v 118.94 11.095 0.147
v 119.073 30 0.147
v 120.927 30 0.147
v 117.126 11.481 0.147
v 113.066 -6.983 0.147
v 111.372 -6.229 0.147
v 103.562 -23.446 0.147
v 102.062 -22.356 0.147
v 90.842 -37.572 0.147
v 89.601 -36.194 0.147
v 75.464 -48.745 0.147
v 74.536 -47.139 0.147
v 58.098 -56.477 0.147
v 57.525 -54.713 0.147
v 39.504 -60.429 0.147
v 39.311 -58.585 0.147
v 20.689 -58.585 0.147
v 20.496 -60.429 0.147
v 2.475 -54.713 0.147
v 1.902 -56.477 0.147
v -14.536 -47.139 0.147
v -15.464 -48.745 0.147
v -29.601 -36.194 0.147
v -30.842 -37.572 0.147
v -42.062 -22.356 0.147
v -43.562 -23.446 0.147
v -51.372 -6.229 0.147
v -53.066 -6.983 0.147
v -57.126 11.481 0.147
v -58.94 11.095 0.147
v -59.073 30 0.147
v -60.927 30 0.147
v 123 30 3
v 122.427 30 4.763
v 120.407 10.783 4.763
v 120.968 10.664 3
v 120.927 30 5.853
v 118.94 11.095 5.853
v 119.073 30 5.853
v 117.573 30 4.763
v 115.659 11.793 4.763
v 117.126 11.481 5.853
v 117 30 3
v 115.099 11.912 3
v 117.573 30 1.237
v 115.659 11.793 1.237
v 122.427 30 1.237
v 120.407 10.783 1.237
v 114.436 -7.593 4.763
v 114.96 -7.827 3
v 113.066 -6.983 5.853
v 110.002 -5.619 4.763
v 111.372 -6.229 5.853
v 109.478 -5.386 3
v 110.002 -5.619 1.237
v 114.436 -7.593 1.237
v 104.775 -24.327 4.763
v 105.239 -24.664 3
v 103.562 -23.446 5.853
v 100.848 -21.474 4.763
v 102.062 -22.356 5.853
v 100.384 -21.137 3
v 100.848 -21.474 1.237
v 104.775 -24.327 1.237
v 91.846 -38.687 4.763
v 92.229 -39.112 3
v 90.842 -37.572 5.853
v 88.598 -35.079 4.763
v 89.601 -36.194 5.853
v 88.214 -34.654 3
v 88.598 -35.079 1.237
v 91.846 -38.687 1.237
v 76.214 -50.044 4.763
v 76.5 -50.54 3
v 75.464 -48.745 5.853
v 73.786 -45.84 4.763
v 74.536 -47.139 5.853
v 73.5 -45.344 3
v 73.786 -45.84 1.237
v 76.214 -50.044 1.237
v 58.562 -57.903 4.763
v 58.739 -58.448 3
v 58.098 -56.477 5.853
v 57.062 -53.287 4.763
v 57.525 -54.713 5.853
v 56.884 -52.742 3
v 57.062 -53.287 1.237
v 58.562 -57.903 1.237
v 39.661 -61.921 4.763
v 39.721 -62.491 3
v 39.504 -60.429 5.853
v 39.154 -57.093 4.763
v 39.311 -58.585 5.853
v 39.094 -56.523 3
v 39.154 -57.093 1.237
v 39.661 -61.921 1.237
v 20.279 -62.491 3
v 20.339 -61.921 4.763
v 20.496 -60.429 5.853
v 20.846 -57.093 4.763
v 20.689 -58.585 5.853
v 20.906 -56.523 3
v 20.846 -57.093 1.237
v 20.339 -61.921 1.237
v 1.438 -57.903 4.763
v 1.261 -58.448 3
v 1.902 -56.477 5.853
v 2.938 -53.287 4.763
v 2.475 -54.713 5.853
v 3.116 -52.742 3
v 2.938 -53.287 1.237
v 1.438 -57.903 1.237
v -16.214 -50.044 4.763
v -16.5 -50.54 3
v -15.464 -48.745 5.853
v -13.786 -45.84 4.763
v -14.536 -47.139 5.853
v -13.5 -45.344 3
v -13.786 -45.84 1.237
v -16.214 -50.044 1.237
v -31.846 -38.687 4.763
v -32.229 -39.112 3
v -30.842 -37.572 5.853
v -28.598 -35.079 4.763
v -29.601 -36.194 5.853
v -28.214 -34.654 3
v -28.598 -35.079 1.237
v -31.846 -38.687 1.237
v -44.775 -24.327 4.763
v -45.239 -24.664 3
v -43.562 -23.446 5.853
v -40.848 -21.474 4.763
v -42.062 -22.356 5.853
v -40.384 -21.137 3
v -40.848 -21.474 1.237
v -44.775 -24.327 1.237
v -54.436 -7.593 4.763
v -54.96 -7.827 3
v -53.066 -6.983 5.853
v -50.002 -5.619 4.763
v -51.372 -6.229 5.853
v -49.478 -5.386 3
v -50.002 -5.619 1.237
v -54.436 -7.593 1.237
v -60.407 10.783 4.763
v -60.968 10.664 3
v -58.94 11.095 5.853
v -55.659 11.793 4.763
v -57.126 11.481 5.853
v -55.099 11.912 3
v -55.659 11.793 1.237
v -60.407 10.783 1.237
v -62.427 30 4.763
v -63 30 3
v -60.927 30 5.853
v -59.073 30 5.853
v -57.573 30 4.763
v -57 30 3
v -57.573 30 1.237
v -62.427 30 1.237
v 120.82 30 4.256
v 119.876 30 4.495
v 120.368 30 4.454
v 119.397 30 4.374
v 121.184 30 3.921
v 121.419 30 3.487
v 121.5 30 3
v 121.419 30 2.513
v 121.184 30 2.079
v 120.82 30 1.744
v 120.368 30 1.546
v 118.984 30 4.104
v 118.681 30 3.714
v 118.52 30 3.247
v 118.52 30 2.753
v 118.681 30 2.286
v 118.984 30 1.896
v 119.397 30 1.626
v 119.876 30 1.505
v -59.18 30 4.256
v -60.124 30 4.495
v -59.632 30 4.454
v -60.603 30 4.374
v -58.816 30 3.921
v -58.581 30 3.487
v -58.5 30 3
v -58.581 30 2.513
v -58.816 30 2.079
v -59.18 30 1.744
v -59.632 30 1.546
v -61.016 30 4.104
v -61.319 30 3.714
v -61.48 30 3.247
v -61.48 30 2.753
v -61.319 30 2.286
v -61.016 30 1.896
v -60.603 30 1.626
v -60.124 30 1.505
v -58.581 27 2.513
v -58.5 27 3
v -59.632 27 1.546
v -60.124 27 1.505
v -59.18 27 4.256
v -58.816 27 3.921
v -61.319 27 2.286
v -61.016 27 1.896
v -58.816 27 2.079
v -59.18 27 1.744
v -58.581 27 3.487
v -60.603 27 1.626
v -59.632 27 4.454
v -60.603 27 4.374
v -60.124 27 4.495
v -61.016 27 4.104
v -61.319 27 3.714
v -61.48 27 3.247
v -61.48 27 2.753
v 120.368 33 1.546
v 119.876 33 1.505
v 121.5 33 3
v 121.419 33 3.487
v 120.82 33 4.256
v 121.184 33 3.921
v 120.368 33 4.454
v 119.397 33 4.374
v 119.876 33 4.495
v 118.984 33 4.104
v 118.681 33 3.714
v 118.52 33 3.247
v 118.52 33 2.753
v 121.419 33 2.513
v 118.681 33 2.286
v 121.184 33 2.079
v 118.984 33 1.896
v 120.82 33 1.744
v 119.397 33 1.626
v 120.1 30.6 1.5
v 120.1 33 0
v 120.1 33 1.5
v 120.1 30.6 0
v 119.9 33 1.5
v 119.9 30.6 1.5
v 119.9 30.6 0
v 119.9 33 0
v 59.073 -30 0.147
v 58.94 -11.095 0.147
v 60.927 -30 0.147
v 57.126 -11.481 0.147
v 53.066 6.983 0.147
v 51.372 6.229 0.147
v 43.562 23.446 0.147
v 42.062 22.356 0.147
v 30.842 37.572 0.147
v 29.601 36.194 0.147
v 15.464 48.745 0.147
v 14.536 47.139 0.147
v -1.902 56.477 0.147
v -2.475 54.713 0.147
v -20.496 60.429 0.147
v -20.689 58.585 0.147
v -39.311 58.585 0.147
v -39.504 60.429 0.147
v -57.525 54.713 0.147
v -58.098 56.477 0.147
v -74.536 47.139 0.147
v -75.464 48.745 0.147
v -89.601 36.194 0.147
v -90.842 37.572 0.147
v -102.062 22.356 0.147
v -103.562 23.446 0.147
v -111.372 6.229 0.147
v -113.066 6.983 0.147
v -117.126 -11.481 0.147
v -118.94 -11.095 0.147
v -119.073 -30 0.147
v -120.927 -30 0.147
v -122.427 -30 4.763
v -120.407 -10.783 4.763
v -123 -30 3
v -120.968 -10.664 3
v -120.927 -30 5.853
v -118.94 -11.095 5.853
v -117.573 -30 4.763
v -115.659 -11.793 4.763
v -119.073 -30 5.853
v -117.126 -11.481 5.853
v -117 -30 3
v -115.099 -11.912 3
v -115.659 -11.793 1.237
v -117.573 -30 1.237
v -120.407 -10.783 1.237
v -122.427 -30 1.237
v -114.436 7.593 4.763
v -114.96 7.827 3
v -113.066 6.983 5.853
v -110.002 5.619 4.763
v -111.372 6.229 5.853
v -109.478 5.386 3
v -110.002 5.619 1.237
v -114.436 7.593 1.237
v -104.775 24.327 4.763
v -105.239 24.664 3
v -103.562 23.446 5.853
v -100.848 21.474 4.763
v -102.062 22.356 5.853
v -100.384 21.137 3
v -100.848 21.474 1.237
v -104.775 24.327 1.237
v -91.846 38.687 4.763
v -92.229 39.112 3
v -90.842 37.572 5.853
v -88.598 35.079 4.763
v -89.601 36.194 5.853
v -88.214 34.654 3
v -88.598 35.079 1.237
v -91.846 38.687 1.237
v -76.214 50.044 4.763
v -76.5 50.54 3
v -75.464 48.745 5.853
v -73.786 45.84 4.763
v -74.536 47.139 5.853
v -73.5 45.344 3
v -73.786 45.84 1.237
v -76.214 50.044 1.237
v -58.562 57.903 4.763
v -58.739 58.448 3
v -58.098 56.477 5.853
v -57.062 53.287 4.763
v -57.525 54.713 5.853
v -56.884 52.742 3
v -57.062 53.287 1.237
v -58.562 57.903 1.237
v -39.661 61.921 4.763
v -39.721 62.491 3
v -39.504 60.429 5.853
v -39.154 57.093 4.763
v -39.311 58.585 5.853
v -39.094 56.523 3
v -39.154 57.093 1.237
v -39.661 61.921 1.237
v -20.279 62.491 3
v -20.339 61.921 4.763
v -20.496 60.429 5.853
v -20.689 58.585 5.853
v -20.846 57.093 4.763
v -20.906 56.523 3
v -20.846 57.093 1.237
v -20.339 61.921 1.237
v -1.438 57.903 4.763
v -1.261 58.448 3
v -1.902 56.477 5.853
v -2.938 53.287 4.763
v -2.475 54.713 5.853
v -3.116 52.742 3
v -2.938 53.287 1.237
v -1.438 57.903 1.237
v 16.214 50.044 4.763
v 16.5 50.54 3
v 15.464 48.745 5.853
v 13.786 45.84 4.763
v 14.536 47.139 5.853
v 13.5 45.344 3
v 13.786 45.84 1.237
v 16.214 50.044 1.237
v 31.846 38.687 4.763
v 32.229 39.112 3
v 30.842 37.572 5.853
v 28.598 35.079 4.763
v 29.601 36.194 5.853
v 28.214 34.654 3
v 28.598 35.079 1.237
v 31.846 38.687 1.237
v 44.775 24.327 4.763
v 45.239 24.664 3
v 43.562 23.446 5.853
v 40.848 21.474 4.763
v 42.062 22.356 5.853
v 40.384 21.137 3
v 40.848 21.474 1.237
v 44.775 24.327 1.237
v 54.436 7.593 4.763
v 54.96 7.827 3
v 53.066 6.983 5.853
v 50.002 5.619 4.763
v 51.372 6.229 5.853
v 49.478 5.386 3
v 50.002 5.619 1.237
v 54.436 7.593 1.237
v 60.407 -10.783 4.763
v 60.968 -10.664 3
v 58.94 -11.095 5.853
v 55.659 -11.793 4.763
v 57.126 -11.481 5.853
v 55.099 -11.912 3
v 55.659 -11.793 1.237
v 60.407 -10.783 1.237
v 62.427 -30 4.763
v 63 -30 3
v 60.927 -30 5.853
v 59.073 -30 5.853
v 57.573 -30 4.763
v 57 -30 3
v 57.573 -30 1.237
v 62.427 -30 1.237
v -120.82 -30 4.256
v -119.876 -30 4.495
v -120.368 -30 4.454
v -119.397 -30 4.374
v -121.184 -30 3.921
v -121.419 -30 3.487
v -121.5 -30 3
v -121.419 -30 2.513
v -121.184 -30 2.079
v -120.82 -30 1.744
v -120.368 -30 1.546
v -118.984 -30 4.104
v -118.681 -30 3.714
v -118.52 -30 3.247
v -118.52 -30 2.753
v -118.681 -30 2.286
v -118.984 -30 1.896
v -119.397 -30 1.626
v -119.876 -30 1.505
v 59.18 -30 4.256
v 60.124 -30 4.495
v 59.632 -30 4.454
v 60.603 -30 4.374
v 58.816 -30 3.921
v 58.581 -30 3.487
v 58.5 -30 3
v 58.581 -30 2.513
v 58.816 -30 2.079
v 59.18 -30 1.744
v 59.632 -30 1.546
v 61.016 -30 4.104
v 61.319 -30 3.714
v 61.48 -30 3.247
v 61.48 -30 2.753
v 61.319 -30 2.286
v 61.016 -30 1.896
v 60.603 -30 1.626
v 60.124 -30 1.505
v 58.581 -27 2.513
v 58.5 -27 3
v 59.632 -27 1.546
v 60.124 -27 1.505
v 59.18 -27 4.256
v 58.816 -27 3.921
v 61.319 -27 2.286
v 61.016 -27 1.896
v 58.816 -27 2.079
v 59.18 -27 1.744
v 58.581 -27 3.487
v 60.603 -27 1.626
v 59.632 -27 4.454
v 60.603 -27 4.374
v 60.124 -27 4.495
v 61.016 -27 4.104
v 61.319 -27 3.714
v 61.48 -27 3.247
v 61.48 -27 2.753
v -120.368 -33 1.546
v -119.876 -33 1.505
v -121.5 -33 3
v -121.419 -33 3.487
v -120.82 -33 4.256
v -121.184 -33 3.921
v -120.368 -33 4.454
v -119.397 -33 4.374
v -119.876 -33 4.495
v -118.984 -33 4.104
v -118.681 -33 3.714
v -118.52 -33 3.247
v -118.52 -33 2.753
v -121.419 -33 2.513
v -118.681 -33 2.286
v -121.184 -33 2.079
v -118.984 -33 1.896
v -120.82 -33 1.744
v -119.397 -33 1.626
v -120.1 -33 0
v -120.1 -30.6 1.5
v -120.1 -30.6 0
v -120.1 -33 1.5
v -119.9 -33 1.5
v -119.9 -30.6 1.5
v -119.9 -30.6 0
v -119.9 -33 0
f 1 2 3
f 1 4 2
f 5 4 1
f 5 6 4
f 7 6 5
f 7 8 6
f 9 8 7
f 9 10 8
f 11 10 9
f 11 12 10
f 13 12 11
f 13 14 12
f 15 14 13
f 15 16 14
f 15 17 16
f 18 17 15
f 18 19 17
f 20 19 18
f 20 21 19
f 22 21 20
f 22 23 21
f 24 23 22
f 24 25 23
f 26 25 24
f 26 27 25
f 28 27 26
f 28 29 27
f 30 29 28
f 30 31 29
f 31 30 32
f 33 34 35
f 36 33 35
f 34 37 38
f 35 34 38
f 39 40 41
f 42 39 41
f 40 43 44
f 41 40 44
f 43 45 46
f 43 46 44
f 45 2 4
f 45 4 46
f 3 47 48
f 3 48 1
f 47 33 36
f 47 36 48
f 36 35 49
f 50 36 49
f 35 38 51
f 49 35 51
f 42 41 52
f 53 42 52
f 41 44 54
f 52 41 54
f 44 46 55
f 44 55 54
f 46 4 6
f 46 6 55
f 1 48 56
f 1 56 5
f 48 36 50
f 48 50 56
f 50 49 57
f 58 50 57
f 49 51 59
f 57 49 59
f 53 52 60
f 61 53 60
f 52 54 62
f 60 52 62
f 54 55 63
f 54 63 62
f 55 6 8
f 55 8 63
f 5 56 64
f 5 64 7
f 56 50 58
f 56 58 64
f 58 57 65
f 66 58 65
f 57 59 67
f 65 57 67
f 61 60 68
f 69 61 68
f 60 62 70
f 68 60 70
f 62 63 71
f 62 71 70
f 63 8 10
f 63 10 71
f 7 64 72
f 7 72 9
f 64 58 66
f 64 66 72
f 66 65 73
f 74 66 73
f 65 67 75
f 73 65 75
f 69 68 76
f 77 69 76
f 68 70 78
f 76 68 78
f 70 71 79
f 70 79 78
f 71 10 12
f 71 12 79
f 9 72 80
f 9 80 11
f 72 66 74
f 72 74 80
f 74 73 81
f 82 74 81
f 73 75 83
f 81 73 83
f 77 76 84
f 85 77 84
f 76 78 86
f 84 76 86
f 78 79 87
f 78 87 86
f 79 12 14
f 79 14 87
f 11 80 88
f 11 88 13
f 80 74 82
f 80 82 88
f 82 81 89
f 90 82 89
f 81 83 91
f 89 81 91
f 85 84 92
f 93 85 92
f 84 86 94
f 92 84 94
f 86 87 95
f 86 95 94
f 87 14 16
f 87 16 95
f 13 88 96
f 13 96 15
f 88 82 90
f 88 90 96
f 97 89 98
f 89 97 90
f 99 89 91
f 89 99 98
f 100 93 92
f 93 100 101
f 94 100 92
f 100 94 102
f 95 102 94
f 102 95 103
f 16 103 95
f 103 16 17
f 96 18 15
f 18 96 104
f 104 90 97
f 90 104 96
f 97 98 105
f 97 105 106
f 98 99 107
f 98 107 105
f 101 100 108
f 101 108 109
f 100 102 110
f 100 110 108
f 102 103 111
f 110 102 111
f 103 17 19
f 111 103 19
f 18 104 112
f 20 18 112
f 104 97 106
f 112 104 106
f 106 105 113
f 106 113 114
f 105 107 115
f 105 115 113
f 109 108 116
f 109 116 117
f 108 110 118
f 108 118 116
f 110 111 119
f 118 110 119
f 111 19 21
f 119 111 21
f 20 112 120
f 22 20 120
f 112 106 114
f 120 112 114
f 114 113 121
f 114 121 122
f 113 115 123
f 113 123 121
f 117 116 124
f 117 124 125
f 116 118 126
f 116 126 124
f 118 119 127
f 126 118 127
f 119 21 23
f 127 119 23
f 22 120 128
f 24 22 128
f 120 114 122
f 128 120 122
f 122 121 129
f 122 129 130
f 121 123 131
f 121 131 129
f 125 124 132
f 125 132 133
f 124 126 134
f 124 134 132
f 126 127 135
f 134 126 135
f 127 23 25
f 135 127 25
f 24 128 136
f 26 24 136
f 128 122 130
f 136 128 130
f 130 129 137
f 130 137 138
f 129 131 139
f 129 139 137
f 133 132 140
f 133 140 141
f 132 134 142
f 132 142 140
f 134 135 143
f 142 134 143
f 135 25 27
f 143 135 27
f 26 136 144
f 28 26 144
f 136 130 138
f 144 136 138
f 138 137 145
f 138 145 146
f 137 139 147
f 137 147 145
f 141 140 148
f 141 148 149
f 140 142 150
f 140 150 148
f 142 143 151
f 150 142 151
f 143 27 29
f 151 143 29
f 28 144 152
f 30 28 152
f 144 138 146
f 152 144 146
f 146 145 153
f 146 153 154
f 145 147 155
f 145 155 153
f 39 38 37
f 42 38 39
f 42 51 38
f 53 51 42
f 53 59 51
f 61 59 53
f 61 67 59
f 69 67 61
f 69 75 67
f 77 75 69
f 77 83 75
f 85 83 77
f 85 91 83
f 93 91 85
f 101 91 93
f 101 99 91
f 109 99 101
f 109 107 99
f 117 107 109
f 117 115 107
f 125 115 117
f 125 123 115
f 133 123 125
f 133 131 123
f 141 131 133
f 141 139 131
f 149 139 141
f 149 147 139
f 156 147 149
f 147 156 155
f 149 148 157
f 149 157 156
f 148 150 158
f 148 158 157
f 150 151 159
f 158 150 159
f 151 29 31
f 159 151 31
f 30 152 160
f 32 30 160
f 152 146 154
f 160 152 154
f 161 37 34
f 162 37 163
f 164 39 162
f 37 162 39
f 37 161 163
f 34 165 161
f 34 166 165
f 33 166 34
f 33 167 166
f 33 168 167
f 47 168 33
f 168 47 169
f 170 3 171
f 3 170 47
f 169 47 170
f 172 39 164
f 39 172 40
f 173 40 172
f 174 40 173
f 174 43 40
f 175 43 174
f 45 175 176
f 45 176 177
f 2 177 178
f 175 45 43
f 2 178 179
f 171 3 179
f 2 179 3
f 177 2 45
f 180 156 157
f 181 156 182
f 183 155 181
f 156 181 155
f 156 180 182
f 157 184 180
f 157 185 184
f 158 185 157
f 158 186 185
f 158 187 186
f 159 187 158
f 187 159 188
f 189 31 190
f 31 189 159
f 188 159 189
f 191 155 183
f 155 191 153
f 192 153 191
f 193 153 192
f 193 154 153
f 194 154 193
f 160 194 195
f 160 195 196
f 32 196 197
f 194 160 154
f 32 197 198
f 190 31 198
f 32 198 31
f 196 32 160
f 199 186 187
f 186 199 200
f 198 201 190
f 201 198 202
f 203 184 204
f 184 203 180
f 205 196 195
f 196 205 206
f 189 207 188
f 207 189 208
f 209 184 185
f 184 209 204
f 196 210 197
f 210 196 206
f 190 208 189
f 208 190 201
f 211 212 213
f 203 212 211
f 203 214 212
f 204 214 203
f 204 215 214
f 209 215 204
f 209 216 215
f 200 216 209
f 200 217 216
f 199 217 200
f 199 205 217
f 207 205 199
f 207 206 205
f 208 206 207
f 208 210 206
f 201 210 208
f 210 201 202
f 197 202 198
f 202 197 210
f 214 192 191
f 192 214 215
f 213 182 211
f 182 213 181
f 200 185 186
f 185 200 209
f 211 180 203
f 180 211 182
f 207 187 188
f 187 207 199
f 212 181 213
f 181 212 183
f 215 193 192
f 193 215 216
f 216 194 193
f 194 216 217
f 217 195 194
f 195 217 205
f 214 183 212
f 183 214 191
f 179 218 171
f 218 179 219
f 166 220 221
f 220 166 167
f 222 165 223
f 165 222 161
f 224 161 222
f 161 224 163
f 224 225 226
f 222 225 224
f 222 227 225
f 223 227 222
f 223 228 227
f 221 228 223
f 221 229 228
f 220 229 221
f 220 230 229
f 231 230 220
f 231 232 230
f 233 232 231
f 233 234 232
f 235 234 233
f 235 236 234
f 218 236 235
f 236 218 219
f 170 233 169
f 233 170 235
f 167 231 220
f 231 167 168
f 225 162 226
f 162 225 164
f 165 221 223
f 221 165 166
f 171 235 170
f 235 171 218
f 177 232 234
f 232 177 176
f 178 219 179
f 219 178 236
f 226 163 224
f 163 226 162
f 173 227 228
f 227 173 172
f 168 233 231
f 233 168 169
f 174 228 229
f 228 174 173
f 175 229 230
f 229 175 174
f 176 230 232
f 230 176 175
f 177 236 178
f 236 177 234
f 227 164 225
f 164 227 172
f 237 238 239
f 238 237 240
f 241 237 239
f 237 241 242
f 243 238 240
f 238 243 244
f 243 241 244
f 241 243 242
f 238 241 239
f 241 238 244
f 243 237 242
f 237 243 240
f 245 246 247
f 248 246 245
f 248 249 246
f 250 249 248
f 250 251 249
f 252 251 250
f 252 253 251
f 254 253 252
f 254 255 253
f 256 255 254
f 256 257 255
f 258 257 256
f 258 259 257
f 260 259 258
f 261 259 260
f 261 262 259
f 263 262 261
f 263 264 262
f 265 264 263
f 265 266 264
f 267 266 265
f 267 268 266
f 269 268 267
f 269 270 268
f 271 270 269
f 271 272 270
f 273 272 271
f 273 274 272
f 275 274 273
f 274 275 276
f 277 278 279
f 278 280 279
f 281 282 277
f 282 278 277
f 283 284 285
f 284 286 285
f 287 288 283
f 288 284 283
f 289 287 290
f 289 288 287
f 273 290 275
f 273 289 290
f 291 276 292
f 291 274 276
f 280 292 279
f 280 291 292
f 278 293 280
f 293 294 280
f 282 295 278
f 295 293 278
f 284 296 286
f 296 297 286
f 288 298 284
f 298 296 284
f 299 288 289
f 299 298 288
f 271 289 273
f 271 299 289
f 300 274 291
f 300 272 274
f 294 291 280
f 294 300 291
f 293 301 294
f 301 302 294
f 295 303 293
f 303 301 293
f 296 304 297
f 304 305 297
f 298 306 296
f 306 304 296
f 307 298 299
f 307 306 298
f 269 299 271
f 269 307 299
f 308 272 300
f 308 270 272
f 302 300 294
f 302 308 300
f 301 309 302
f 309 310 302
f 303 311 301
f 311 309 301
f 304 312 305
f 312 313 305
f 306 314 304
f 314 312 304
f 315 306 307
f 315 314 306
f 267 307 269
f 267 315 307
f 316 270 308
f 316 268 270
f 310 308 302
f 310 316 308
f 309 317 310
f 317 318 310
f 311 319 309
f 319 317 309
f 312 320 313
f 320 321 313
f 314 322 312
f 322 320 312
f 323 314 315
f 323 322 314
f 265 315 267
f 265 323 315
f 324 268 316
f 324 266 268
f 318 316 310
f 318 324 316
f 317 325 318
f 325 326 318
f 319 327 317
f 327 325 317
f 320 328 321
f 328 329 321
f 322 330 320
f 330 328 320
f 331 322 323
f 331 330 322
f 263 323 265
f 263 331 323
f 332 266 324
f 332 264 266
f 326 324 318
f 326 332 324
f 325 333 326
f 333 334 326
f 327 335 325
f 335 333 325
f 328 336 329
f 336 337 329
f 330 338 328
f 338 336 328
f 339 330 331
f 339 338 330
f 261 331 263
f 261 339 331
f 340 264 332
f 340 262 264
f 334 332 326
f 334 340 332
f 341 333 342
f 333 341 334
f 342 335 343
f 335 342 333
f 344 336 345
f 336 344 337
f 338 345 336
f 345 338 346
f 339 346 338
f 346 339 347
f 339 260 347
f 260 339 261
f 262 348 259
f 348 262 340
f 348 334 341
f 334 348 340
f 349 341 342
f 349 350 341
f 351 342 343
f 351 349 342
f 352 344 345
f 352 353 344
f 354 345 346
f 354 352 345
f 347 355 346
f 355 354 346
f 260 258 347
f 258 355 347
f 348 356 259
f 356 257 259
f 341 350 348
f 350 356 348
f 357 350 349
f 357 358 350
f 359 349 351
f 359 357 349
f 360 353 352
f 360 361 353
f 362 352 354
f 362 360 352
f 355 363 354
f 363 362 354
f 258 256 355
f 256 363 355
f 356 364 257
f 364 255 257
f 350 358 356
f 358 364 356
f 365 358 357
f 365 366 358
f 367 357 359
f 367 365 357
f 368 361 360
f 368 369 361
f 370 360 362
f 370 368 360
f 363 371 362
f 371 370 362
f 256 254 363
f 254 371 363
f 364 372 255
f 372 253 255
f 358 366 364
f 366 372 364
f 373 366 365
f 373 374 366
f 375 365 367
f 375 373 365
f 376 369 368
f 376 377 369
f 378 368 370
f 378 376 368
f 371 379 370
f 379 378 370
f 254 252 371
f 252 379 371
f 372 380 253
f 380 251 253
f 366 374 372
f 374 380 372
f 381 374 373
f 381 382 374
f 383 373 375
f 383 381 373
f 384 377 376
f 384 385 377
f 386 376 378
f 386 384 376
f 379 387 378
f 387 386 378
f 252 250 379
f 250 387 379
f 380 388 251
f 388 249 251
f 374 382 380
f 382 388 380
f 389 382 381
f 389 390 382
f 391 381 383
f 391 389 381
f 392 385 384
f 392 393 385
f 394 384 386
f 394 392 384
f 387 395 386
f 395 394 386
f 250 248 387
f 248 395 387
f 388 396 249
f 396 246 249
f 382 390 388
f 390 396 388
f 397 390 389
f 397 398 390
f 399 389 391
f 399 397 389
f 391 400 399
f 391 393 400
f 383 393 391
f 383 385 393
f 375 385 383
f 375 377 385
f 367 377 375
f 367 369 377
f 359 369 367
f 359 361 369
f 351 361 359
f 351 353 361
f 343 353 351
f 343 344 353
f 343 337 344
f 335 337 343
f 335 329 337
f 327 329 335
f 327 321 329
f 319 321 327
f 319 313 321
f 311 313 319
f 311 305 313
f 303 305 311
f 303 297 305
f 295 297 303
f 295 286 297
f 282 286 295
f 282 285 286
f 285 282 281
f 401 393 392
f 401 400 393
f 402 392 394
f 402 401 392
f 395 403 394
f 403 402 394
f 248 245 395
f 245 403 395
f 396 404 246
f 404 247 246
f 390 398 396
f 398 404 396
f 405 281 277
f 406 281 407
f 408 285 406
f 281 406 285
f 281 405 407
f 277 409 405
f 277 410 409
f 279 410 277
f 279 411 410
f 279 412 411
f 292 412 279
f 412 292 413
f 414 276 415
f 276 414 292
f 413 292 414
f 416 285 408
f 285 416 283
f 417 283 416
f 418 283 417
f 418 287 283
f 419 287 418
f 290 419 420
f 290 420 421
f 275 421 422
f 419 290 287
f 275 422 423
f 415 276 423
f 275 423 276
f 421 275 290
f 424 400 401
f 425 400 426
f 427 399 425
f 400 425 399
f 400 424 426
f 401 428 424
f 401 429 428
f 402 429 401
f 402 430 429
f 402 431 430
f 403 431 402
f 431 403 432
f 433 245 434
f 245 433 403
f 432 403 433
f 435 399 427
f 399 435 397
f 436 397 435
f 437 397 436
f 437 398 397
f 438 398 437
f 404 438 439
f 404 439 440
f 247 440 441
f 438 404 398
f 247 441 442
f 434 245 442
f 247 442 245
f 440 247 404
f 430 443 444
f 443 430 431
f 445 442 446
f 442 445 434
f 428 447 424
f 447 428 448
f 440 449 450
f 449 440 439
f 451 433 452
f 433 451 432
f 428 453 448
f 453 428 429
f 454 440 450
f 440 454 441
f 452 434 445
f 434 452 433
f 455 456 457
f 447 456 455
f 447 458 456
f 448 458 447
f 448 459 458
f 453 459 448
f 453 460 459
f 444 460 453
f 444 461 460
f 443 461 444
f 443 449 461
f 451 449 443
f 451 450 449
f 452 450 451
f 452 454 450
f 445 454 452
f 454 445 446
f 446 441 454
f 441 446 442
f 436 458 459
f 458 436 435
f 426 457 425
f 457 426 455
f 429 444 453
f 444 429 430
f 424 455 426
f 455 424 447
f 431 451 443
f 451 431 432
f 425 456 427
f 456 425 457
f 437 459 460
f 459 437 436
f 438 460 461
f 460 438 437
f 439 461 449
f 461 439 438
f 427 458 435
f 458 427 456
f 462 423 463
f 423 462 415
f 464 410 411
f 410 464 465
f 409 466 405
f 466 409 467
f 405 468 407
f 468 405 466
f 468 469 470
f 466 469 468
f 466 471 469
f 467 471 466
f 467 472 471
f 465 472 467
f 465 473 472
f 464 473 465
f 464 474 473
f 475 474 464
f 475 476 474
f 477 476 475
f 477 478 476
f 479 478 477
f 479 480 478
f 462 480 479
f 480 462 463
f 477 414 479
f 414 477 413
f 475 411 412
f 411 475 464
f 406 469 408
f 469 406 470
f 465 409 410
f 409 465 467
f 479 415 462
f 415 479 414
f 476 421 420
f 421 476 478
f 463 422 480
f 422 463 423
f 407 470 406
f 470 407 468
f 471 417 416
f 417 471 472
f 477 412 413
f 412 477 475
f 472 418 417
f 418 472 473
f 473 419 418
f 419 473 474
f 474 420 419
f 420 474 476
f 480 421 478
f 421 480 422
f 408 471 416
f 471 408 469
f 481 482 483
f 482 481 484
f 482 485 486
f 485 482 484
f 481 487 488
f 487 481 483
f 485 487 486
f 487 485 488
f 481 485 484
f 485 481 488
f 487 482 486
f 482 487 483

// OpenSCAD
//Anthony Weber
//agweber@indiana.edu
//March 15, 2013

//build platform replicator2
//--284mm long
//--154mm wide
//--152mm tall

//From origin to center of ring
radius = 90; //

//Thickness is the diameter of the circle
thickness = 6; //

//Build support for nib? 1 == true
addSupport = 1; //[0:1]


//Fine tuning Y, bring circles closer
closeY = 0; //[0:20]

//Fine tuning X, bring circles closer
closeX = 0; //[0:20]

//Fine tuning, nib support thickness
supportThickness = 0.2;

//Show platform, 1 == true
showPlatform = 0; //[0:1]

//Platform X
platformX = 284;
//Platform Y
platformY = 154;

translate([radius/3 - closeX,radius/3 + closeY,0])
	wheelquarter(radius,thickness,addSupport);
rotate([0,0,180]) translate([radius/3 - closeX,radius/3 + closeY,0])
	wheelquarter(radius,thickness,addSupport);


module wheelquarter(wheelRadius=120, wheelThickness=6, support=1) {
	added=wheelRadius+wheelThickness/2;
	barSpacing = 10; //centimeter between the wheel bars
	difference() {
		union() {
			translate([0,0,wheelThickness/2])
				rotate_extrude() { //donut shape
				  translate([wheelRadius,0,0]) circle(r=wheelThickness/2);
				}
		}
		//Two cubes for halving the donut (could be one, I know)
		color("red") cube([added,added,wheelThickness]);
		translate([-added,0,0])color("red") cube([added,added,wheelThickness]);

		translate([-wheelRadius,0.5,wheelThickness/2]) //anti-nib
			rotate([90,0,0]) scale([0.25,0.25,1])
				cylinder(r=wheelThickness,h=wheelThickness/2+0.5);
	}
	translate([wheelRadius,wheelThickness/2,wheelThickness/2]) //nib
		rotate([90,0,0]) scale([0.25,0.25,1])
			cylinder(r=wheelThickness,h=wheelThickness/2);
	//Nib support.. thin cube underneath it could easily be cut off
	if (support != 0) {
		translate([wheelRadius-supportThickness/2,wheelThickness/2*0.2,0])
			color("white") cube([supportThickness,wheelThickness/2*0.8,wheelThickness/4]);
	}
}

//build platform
if (showPlatform != 0) {
	translate([-platformX/2,-platformY/2,-1])
		color("gray") cube([platformX,platformY,0.9]);
}
